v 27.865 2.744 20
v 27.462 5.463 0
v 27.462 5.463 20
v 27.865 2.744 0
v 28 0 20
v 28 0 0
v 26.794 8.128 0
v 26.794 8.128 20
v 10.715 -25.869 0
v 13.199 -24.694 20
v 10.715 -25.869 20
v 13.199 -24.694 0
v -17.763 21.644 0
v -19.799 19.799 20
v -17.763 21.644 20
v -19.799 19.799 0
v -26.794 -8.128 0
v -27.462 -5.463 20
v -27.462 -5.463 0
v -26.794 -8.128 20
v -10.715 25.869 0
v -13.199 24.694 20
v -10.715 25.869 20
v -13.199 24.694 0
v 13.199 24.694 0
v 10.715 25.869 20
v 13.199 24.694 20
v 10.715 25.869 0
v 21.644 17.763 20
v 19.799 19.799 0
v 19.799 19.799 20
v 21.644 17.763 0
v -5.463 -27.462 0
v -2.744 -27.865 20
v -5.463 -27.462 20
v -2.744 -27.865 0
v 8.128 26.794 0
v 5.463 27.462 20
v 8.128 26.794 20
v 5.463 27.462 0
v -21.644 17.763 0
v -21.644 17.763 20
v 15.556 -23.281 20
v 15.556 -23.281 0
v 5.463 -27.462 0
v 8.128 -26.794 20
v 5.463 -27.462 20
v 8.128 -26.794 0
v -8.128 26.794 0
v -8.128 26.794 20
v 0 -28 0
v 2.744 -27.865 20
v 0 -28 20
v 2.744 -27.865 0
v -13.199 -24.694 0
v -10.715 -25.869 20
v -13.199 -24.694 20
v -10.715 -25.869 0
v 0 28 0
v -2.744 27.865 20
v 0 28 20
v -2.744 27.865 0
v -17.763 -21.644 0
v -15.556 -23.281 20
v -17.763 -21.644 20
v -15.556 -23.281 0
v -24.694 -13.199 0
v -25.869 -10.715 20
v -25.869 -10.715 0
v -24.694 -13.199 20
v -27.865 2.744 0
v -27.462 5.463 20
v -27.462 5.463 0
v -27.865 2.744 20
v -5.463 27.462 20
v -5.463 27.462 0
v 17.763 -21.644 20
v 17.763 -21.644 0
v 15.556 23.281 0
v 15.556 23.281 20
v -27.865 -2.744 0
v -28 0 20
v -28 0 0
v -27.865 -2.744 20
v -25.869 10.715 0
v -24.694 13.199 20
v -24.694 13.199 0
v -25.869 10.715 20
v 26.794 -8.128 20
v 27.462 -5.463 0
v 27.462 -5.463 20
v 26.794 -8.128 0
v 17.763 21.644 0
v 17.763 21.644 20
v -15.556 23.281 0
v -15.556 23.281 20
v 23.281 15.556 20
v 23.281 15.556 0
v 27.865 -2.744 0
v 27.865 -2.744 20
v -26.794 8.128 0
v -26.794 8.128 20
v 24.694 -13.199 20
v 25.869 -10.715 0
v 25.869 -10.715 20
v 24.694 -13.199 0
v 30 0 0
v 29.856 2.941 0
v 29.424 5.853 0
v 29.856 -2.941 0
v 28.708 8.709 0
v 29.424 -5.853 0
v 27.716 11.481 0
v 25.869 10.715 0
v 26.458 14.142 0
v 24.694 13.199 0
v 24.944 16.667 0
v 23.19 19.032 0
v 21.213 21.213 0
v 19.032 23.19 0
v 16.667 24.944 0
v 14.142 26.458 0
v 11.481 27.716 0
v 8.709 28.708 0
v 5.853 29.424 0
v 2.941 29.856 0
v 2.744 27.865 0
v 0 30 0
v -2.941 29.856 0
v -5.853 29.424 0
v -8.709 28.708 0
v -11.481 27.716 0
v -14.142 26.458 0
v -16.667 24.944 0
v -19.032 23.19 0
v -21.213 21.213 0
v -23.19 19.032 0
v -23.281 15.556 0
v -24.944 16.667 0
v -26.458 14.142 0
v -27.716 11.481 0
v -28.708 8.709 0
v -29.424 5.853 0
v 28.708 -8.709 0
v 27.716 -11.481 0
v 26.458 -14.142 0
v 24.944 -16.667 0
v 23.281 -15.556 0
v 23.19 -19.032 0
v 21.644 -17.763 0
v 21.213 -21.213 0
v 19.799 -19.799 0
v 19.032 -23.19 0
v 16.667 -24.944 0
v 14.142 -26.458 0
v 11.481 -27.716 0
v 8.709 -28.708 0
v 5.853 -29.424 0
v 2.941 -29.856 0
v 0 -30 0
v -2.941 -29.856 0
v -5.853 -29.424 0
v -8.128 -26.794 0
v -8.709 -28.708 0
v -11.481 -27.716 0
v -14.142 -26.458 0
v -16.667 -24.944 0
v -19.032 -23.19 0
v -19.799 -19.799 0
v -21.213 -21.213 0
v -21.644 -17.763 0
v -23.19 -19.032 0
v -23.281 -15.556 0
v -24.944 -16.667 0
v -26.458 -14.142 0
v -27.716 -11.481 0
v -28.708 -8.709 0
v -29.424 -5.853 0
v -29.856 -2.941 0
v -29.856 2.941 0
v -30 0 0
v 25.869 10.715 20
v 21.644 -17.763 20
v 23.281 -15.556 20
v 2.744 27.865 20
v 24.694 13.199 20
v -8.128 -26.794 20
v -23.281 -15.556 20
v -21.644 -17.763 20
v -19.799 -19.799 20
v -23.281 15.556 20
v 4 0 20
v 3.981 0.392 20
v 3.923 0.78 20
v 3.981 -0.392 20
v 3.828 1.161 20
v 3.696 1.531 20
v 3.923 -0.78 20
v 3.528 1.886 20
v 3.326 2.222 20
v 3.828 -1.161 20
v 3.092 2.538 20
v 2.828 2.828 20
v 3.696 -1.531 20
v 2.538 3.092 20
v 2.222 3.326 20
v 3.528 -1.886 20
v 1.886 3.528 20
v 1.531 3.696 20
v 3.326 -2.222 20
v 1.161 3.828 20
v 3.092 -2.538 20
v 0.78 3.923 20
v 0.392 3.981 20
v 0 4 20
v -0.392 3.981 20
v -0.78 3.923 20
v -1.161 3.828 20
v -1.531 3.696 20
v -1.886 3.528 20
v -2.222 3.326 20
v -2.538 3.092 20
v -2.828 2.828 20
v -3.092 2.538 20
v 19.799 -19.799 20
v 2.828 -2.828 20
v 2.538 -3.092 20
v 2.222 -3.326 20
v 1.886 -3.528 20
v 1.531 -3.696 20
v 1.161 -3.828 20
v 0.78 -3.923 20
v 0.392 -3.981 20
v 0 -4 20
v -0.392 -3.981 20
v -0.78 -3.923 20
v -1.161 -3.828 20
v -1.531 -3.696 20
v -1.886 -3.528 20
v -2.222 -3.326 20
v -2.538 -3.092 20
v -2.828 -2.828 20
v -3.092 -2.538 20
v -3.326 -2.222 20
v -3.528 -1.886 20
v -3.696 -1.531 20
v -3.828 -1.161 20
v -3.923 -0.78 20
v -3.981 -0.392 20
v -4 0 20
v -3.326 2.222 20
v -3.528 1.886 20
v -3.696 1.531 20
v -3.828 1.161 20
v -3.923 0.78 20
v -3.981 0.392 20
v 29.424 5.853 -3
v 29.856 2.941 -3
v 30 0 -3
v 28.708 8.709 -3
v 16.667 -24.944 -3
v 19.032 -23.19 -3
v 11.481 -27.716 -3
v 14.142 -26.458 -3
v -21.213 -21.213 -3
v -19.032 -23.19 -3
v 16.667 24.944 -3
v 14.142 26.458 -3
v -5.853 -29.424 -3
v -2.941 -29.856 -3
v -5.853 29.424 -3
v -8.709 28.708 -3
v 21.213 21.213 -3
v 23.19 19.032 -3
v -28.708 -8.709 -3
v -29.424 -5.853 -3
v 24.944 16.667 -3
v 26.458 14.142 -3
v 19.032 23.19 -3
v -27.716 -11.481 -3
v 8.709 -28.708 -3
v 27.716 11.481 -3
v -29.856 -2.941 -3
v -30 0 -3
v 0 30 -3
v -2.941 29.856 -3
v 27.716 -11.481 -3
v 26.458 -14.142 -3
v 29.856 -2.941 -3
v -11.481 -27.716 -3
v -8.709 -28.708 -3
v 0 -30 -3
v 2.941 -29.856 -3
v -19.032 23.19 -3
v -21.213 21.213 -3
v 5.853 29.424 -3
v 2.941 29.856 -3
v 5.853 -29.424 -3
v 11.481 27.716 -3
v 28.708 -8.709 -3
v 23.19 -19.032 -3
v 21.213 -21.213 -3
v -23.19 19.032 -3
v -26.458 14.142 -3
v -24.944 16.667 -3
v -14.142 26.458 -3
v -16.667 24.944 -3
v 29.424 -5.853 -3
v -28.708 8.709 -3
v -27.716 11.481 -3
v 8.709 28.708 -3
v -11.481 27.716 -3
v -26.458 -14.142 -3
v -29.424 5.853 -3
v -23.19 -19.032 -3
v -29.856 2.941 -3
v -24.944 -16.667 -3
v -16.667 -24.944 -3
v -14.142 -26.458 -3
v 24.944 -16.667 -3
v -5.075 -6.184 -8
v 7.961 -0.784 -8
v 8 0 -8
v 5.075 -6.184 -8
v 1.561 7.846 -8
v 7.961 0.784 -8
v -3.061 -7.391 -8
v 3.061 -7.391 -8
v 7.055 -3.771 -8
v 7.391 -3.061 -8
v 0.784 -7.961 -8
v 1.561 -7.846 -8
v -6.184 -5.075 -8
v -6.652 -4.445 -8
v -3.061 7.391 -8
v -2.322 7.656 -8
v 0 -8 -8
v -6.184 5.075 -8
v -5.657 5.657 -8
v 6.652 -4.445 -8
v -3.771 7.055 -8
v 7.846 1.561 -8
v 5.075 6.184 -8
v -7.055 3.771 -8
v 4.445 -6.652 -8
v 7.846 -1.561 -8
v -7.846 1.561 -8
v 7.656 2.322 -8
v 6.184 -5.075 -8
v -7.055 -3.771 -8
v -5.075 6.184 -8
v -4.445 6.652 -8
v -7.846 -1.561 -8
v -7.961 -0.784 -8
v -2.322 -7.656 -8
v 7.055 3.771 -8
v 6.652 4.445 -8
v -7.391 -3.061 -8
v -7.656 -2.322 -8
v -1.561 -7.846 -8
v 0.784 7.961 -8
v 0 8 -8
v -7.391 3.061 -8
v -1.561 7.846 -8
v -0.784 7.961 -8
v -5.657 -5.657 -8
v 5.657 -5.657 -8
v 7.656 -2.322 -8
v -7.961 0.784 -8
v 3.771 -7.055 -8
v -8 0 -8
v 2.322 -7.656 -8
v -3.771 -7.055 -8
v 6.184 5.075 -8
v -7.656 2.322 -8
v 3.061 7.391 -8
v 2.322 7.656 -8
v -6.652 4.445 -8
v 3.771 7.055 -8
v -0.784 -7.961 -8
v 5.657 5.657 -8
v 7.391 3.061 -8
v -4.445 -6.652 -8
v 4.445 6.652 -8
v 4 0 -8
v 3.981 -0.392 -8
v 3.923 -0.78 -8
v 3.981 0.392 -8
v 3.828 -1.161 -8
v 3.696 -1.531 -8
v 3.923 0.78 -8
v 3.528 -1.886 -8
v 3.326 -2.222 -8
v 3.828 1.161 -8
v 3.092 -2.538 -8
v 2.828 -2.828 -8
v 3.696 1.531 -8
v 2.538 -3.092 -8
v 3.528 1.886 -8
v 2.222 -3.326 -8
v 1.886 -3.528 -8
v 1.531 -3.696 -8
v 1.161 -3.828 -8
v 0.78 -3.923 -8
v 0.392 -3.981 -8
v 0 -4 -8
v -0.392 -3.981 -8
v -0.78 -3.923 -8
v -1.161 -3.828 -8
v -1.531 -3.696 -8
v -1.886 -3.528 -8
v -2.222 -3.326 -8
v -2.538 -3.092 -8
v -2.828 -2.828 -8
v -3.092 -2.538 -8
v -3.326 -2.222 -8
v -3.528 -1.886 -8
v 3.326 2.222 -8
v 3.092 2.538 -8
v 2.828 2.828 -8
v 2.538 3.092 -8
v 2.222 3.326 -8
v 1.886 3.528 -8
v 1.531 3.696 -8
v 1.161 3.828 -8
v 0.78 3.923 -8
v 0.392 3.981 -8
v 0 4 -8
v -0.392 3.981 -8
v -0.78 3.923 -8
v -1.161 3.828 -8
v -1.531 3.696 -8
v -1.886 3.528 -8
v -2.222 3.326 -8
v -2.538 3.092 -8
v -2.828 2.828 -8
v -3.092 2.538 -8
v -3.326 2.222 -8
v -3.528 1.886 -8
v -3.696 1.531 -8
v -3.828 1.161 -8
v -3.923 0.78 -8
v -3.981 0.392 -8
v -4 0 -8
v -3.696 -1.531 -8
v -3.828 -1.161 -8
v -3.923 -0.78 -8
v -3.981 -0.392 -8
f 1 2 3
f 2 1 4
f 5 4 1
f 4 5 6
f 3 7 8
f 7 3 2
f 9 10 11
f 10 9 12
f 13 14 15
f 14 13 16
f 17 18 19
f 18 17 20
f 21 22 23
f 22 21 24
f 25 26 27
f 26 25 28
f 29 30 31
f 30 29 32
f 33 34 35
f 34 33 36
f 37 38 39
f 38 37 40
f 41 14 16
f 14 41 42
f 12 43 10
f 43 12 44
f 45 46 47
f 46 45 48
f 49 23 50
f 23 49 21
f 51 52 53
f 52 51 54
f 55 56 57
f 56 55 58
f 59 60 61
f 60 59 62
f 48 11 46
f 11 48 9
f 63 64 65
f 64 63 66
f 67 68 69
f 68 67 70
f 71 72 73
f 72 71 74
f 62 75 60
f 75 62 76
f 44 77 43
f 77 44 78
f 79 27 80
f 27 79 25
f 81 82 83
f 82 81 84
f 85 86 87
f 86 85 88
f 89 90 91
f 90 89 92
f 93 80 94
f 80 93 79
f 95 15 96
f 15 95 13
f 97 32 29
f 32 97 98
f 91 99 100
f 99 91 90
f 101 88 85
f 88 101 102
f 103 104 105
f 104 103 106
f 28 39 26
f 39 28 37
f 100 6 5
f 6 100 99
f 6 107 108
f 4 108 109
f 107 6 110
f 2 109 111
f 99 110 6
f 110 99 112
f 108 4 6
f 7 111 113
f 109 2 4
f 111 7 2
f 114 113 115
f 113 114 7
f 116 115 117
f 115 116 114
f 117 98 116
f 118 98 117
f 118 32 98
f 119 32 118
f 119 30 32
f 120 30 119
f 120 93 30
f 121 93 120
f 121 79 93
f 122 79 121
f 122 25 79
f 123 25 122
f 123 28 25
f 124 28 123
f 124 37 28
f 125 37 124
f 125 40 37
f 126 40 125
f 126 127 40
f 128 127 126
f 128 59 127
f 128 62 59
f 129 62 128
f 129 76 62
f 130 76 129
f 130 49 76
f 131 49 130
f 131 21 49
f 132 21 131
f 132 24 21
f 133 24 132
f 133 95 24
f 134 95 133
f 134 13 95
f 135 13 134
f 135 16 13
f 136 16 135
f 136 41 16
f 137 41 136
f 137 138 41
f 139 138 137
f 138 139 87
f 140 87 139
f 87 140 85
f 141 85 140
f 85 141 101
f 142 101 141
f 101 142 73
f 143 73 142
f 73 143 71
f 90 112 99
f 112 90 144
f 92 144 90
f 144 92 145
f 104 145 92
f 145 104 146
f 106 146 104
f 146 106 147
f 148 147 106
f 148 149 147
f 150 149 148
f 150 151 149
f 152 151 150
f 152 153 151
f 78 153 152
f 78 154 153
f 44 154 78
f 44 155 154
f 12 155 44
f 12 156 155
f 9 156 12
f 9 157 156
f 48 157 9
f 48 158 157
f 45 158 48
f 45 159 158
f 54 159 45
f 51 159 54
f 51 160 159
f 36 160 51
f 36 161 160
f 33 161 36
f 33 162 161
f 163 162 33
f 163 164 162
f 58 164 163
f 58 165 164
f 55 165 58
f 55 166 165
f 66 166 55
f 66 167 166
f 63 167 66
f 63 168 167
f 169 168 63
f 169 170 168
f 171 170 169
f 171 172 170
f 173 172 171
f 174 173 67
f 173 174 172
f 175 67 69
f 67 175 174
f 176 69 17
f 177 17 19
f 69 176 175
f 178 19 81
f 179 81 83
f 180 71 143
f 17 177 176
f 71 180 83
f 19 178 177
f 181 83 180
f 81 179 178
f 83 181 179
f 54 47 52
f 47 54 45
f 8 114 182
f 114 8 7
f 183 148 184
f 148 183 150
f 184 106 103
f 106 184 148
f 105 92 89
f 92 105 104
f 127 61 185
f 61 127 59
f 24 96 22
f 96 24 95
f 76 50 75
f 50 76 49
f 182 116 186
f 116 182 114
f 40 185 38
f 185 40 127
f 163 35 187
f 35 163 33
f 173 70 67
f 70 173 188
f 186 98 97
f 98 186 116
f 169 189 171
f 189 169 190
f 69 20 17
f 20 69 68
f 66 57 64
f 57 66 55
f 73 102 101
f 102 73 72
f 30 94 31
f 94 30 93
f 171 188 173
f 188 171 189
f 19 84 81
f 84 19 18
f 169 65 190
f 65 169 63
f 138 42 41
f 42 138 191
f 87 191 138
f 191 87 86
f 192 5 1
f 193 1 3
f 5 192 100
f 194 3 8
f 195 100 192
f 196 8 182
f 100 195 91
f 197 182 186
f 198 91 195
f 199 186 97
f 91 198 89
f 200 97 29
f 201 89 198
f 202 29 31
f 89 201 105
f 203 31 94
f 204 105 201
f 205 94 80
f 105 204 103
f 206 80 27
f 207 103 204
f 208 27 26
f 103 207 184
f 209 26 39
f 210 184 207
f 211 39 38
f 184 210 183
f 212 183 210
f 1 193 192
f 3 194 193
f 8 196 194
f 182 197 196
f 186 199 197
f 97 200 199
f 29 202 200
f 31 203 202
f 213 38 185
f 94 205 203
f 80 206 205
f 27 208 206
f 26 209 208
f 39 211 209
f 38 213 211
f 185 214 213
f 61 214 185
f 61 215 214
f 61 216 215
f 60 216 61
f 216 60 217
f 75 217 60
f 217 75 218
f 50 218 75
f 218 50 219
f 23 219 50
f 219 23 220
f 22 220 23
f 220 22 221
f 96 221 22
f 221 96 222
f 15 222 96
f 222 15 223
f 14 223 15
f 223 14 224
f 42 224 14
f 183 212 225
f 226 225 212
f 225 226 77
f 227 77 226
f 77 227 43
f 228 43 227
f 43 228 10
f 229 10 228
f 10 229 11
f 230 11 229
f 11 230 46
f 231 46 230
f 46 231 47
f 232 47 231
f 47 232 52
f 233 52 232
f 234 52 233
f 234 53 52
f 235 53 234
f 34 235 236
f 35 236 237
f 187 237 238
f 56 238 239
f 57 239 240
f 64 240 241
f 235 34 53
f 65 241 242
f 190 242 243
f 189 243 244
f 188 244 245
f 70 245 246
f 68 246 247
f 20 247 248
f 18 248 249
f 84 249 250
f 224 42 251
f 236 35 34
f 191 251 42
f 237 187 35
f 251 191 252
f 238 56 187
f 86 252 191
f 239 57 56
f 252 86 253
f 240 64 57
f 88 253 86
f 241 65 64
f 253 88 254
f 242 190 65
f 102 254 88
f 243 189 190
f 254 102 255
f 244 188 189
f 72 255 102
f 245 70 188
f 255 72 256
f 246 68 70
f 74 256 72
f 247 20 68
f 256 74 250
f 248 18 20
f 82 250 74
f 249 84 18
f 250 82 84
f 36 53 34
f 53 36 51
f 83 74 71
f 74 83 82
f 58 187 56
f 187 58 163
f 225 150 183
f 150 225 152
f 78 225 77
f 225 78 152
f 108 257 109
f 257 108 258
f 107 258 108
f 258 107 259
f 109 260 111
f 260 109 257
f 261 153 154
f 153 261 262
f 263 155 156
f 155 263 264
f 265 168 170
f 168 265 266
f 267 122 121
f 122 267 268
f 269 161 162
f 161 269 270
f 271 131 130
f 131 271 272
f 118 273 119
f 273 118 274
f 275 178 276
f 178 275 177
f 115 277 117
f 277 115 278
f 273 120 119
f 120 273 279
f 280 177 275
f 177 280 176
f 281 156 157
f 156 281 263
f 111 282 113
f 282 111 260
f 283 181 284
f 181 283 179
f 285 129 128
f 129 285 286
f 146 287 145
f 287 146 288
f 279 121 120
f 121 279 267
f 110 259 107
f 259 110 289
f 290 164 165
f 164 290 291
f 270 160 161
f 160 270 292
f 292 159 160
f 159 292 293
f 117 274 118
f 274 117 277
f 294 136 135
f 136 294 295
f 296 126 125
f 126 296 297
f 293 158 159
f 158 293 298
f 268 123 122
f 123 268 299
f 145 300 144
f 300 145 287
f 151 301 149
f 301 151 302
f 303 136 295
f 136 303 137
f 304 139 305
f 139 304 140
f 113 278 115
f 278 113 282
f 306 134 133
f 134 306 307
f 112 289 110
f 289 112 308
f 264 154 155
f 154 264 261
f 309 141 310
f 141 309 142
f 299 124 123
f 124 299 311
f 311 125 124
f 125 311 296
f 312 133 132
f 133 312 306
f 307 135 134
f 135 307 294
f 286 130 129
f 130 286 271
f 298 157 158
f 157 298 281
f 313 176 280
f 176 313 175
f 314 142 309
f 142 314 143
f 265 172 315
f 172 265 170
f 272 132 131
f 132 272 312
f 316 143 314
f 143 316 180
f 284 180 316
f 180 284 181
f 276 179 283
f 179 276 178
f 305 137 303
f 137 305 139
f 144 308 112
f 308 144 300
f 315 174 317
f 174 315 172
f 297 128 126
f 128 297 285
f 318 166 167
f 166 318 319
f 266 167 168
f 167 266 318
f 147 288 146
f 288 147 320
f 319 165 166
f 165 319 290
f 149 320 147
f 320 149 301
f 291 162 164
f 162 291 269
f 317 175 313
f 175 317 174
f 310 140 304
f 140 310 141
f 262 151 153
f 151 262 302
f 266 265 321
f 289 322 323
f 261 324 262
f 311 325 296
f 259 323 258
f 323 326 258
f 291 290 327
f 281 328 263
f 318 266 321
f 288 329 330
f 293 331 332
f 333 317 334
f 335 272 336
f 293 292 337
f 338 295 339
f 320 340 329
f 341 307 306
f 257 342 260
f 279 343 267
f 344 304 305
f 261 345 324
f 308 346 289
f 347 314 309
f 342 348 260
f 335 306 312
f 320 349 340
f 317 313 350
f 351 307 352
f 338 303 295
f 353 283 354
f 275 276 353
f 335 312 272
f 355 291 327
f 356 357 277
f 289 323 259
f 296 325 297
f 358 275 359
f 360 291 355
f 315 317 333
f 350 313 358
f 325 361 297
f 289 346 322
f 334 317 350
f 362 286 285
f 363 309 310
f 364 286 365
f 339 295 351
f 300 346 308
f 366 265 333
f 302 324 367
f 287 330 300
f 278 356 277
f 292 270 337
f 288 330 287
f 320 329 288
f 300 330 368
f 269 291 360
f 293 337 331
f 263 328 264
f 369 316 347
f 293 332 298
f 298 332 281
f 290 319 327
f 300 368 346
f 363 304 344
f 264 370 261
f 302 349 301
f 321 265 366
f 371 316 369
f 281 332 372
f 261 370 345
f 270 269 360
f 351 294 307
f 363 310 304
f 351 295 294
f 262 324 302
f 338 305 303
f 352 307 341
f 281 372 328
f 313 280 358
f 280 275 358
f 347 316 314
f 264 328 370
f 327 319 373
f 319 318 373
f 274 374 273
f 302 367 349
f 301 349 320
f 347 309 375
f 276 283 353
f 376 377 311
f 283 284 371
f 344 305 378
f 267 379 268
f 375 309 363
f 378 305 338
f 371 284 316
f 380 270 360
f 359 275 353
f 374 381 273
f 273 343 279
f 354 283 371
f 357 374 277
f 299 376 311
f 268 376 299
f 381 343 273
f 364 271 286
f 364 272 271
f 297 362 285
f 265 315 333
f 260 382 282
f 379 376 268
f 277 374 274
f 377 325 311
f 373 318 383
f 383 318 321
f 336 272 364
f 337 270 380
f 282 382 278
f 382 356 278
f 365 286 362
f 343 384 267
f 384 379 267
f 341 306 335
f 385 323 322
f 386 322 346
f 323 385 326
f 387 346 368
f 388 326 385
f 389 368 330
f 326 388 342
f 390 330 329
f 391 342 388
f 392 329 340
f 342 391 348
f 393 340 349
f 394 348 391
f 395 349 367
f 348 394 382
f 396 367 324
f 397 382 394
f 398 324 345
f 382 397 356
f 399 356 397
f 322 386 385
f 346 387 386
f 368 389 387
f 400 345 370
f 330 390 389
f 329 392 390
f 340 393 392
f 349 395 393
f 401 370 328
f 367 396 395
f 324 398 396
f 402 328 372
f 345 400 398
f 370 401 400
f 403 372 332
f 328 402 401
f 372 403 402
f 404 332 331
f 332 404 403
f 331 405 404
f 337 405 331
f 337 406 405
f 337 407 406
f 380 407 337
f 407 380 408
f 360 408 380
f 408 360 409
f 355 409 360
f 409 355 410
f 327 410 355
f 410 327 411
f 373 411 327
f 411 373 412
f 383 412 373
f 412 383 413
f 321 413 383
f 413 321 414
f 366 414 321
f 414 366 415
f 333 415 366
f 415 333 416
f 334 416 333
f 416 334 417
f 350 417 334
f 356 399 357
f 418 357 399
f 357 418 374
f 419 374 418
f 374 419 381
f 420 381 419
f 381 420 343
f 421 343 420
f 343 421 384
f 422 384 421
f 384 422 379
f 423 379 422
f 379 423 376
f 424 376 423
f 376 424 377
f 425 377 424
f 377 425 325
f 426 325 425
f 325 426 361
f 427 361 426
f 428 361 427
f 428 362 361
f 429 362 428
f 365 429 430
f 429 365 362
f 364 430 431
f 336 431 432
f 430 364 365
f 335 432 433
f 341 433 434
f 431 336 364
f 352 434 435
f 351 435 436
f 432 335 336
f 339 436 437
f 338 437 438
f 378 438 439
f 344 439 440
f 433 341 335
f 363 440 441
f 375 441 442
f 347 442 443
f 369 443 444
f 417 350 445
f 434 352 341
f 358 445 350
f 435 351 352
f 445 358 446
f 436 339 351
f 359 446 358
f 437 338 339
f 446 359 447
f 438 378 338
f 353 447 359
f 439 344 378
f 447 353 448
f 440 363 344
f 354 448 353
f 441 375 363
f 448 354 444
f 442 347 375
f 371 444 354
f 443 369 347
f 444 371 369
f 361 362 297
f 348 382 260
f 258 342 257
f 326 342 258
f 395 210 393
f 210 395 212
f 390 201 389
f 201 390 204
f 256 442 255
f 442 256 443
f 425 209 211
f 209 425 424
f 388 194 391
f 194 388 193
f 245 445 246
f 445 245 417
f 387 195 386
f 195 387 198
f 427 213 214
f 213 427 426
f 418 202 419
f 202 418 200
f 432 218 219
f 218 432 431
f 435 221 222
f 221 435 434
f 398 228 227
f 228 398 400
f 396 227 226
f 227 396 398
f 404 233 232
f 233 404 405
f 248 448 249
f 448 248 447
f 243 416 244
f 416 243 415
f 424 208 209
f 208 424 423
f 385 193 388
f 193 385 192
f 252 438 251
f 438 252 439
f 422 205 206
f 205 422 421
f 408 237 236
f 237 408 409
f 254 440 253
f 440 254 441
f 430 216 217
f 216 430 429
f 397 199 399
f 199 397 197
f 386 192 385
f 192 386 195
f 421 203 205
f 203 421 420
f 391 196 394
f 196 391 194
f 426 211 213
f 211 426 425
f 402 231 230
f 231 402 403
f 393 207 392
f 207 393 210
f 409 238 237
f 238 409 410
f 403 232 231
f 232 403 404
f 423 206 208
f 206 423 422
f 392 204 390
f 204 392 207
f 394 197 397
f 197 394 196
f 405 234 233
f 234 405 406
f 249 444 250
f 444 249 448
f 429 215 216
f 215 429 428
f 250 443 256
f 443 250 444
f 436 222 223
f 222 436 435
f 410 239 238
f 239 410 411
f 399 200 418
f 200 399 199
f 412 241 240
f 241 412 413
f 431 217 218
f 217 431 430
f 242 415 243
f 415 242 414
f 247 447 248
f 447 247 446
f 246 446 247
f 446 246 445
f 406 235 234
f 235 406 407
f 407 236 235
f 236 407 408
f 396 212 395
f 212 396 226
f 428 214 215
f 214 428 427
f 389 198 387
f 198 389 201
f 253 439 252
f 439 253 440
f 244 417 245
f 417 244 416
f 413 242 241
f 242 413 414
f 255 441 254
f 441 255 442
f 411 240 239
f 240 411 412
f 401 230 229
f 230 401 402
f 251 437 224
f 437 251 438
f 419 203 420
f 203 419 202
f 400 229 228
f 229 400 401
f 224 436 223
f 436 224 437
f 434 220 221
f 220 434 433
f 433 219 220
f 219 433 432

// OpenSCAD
$fn=64;
difference() {
   union() {
      cylinder(r=28,h=20);translate([0,0,-3]) cylinder(r=30,h=3);
      translate([0,0,-8]) cylinder(r1=8,r2=30,h=5);
   }
   cylinder(r=4,h=60,center=true);
}

